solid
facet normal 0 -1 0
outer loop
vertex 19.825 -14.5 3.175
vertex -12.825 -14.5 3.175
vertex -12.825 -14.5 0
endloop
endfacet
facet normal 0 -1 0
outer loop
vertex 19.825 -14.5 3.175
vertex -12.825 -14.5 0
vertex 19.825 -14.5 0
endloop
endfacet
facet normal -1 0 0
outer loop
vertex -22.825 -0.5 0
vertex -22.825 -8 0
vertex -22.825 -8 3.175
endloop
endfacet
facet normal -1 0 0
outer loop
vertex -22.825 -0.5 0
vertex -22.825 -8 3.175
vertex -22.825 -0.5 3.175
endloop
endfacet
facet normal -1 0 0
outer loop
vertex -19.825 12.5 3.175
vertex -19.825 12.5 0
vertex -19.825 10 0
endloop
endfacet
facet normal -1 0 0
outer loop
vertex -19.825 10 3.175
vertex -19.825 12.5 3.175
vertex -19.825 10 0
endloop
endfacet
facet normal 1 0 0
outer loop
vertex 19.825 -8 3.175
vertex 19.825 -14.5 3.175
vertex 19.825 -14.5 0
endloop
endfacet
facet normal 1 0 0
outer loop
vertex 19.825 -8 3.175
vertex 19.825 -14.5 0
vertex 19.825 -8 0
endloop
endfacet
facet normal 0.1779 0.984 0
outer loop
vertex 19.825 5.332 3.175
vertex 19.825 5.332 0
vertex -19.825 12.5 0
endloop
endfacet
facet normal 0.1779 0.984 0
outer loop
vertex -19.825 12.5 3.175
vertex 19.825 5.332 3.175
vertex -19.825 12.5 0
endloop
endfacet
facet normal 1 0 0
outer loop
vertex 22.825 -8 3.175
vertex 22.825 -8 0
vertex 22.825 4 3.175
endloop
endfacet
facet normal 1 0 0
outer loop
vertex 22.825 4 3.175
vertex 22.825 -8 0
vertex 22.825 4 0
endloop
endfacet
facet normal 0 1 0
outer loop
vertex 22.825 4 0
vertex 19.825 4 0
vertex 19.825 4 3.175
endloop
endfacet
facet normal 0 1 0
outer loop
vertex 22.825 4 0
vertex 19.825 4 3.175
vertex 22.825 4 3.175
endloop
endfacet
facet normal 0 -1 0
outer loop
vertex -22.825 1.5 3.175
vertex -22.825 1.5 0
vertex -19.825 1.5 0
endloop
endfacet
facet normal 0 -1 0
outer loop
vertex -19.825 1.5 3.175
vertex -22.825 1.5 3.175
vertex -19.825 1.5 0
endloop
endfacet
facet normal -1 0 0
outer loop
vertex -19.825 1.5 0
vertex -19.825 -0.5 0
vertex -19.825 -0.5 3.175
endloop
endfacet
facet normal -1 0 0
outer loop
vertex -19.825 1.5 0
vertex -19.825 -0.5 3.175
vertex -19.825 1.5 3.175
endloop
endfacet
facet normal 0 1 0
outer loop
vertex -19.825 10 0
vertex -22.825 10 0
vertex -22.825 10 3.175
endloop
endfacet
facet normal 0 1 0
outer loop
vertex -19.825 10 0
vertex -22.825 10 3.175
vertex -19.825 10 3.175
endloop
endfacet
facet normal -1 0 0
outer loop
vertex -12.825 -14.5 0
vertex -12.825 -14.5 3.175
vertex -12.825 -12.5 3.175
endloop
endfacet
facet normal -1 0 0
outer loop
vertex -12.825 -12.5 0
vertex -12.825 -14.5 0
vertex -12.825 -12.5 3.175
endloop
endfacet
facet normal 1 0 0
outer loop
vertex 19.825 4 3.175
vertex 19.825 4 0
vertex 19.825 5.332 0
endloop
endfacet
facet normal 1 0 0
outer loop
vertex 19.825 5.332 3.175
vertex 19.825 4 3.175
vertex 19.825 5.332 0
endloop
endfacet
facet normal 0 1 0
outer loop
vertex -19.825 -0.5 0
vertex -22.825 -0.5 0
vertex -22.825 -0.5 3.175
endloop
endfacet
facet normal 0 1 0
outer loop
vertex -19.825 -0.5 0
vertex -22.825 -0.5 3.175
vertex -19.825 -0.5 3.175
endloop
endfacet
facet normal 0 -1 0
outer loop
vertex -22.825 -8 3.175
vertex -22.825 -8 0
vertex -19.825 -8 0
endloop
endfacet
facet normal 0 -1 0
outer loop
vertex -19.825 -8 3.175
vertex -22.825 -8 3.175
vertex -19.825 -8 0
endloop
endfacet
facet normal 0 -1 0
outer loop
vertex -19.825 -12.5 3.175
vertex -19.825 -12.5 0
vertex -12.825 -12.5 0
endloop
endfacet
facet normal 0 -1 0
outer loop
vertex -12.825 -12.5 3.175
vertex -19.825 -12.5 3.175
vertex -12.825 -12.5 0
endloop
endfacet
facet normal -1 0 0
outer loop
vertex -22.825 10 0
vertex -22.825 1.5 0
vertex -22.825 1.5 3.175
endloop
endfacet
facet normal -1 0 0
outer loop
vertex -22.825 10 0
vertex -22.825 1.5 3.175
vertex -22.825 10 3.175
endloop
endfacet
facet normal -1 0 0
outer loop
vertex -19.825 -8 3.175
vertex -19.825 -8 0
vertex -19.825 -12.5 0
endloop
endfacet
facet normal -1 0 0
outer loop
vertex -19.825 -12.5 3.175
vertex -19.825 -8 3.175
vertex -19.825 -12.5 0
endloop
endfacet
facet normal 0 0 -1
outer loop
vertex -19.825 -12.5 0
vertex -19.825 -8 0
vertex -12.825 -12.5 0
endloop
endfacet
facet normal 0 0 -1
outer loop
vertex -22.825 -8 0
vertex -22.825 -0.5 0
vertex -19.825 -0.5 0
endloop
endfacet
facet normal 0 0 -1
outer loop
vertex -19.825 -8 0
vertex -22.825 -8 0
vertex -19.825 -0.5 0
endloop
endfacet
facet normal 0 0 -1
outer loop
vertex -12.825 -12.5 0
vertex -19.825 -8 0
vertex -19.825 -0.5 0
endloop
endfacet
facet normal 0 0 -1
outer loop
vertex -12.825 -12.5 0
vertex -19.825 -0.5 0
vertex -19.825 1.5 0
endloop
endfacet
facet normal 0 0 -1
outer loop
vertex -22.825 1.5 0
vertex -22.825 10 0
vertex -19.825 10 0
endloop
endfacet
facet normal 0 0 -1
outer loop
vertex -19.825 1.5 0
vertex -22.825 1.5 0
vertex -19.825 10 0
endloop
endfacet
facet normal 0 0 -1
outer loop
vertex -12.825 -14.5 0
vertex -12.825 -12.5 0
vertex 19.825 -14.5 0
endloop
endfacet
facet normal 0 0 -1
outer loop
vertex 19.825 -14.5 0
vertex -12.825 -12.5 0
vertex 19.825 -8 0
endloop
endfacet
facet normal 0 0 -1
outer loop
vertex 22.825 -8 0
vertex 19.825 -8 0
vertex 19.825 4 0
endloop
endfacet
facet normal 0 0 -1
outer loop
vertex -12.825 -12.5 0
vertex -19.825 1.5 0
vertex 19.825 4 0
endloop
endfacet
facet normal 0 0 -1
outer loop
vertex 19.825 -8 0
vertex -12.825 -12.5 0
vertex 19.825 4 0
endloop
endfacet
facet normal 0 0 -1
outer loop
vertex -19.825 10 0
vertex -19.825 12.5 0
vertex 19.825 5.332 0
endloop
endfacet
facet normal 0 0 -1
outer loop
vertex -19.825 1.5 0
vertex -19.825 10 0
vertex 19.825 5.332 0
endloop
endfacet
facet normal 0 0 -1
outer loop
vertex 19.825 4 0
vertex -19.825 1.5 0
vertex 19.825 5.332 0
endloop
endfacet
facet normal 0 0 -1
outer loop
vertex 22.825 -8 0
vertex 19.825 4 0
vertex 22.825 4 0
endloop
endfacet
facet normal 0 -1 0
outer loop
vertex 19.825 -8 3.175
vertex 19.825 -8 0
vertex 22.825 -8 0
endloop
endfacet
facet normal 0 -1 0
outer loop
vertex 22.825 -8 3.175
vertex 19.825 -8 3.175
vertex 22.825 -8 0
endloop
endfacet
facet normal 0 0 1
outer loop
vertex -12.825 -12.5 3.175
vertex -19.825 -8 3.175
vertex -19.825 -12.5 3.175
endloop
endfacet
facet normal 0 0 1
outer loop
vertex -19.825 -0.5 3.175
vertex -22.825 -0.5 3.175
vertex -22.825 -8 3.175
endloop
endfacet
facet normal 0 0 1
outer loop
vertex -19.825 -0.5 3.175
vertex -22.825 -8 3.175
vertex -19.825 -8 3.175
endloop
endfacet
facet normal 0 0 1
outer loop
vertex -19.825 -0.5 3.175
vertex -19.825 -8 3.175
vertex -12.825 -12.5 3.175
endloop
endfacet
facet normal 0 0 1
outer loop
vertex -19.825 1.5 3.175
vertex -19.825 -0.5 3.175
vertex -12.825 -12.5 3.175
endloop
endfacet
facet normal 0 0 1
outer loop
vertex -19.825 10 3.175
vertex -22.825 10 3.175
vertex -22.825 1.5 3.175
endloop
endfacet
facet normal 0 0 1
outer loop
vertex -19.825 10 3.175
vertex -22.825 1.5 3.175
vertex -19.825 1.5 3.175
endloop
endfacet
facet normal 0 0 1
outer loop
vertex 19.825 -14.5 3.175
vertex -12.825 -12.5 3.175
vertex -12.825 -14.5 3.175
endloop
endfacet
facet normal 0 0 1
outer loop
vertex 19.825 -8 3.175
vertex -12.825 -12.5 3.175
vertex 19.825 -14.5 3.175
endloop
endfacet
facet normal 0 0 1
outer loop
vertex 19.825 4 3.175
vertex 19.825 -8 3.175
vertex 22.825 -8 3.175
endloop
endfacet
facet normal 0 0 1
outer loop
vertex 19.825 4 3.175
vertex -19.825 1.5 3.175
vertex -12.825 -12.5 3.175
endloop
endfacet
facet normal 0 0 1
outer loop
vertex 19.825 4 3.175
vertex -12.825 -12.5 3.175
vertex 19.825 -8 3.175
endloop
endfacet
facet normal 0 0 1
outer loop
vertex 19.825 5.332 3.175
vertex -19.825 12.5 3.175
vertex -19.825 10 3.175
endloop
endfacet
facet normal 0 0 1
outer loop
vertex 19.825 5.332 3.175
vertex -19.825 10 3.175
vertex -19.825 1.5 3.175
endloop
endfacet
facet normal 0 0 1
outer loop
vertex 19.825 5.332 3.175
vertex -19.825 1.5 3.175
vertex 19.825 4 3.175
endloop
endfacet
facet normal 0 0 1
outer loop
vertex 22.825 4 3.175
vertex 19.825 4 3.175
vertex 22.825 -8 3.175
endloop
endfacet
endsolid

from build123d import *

# Parameters (mm, degrees)
SKETCH1_W               = 3
SKETCH1_H               = 12
SKETCH1_H_2             = 18
BOSS_EXTRUDE1_DEPTH     = 3.175
SKETCH2_W               = 32.65
SKETCH2_H               = 2
BOSS_EXTRUDE2_DEPTH     = 3.175
CUT_EXTRUDE1_DEPTH      = 28.227031605
CUT_EXTRUDE1_DEPTH_BACK = 28.227031605
SKETCH3_W               = 3
SKETCH3_H               = 2


with BuildPart() as part:
    # Sketch1 → Boss-Extrude1 (new body)
    with BuildSketch(Plane.XY):
        Polygon((19.825, 5.331730769), (-19.825, 12.5), (-19.825, 10), (-19.825, -8), (-19.825, -12.5), (19.825, -12.5), (19.825, -8), (19.825, 4), align=None)
        with Locations((21.325, -2)):
            Rectangle(SKETCH1_W, SKETCH1_H)
        with Locations((-21.325, 1)):
            Rectangle(SKETCH1_W, SKETCH1_H_2)
    extrude(amount=BOSS_EXTRUDE1_DEPTH)

    # Sketch2 → Boss-Extrude2 (add)
    with BuildSketch(Plane.XY.offset(3.175)):
        with Locations((3.5, -13.5)):
            Rectangle(SKETCH2_W, SKETCH2_H)
    extrude(amount=-BOSS_EXTRUDE2_DEPTH)

    # Sketch3 → Cut-Extrude1 (cut, two sides: drawn at the far end of the back side and taken through both)
    with BuildSketch(Plane.XY.offset(3.175).offset(-CUT_EXTRUDE1_DEPTH_BACK)):
        with Locations((-21.325, 0.5)):
            Rectangle(SKETCH3_W, SKETCH3_H)
    extrude(amount=CUT_EXTRUDE1_DEPTH + CUT_EXTRUDE1_DEPTH_BACK, mode=Mode.SUBTRACT)


solid = part.part
